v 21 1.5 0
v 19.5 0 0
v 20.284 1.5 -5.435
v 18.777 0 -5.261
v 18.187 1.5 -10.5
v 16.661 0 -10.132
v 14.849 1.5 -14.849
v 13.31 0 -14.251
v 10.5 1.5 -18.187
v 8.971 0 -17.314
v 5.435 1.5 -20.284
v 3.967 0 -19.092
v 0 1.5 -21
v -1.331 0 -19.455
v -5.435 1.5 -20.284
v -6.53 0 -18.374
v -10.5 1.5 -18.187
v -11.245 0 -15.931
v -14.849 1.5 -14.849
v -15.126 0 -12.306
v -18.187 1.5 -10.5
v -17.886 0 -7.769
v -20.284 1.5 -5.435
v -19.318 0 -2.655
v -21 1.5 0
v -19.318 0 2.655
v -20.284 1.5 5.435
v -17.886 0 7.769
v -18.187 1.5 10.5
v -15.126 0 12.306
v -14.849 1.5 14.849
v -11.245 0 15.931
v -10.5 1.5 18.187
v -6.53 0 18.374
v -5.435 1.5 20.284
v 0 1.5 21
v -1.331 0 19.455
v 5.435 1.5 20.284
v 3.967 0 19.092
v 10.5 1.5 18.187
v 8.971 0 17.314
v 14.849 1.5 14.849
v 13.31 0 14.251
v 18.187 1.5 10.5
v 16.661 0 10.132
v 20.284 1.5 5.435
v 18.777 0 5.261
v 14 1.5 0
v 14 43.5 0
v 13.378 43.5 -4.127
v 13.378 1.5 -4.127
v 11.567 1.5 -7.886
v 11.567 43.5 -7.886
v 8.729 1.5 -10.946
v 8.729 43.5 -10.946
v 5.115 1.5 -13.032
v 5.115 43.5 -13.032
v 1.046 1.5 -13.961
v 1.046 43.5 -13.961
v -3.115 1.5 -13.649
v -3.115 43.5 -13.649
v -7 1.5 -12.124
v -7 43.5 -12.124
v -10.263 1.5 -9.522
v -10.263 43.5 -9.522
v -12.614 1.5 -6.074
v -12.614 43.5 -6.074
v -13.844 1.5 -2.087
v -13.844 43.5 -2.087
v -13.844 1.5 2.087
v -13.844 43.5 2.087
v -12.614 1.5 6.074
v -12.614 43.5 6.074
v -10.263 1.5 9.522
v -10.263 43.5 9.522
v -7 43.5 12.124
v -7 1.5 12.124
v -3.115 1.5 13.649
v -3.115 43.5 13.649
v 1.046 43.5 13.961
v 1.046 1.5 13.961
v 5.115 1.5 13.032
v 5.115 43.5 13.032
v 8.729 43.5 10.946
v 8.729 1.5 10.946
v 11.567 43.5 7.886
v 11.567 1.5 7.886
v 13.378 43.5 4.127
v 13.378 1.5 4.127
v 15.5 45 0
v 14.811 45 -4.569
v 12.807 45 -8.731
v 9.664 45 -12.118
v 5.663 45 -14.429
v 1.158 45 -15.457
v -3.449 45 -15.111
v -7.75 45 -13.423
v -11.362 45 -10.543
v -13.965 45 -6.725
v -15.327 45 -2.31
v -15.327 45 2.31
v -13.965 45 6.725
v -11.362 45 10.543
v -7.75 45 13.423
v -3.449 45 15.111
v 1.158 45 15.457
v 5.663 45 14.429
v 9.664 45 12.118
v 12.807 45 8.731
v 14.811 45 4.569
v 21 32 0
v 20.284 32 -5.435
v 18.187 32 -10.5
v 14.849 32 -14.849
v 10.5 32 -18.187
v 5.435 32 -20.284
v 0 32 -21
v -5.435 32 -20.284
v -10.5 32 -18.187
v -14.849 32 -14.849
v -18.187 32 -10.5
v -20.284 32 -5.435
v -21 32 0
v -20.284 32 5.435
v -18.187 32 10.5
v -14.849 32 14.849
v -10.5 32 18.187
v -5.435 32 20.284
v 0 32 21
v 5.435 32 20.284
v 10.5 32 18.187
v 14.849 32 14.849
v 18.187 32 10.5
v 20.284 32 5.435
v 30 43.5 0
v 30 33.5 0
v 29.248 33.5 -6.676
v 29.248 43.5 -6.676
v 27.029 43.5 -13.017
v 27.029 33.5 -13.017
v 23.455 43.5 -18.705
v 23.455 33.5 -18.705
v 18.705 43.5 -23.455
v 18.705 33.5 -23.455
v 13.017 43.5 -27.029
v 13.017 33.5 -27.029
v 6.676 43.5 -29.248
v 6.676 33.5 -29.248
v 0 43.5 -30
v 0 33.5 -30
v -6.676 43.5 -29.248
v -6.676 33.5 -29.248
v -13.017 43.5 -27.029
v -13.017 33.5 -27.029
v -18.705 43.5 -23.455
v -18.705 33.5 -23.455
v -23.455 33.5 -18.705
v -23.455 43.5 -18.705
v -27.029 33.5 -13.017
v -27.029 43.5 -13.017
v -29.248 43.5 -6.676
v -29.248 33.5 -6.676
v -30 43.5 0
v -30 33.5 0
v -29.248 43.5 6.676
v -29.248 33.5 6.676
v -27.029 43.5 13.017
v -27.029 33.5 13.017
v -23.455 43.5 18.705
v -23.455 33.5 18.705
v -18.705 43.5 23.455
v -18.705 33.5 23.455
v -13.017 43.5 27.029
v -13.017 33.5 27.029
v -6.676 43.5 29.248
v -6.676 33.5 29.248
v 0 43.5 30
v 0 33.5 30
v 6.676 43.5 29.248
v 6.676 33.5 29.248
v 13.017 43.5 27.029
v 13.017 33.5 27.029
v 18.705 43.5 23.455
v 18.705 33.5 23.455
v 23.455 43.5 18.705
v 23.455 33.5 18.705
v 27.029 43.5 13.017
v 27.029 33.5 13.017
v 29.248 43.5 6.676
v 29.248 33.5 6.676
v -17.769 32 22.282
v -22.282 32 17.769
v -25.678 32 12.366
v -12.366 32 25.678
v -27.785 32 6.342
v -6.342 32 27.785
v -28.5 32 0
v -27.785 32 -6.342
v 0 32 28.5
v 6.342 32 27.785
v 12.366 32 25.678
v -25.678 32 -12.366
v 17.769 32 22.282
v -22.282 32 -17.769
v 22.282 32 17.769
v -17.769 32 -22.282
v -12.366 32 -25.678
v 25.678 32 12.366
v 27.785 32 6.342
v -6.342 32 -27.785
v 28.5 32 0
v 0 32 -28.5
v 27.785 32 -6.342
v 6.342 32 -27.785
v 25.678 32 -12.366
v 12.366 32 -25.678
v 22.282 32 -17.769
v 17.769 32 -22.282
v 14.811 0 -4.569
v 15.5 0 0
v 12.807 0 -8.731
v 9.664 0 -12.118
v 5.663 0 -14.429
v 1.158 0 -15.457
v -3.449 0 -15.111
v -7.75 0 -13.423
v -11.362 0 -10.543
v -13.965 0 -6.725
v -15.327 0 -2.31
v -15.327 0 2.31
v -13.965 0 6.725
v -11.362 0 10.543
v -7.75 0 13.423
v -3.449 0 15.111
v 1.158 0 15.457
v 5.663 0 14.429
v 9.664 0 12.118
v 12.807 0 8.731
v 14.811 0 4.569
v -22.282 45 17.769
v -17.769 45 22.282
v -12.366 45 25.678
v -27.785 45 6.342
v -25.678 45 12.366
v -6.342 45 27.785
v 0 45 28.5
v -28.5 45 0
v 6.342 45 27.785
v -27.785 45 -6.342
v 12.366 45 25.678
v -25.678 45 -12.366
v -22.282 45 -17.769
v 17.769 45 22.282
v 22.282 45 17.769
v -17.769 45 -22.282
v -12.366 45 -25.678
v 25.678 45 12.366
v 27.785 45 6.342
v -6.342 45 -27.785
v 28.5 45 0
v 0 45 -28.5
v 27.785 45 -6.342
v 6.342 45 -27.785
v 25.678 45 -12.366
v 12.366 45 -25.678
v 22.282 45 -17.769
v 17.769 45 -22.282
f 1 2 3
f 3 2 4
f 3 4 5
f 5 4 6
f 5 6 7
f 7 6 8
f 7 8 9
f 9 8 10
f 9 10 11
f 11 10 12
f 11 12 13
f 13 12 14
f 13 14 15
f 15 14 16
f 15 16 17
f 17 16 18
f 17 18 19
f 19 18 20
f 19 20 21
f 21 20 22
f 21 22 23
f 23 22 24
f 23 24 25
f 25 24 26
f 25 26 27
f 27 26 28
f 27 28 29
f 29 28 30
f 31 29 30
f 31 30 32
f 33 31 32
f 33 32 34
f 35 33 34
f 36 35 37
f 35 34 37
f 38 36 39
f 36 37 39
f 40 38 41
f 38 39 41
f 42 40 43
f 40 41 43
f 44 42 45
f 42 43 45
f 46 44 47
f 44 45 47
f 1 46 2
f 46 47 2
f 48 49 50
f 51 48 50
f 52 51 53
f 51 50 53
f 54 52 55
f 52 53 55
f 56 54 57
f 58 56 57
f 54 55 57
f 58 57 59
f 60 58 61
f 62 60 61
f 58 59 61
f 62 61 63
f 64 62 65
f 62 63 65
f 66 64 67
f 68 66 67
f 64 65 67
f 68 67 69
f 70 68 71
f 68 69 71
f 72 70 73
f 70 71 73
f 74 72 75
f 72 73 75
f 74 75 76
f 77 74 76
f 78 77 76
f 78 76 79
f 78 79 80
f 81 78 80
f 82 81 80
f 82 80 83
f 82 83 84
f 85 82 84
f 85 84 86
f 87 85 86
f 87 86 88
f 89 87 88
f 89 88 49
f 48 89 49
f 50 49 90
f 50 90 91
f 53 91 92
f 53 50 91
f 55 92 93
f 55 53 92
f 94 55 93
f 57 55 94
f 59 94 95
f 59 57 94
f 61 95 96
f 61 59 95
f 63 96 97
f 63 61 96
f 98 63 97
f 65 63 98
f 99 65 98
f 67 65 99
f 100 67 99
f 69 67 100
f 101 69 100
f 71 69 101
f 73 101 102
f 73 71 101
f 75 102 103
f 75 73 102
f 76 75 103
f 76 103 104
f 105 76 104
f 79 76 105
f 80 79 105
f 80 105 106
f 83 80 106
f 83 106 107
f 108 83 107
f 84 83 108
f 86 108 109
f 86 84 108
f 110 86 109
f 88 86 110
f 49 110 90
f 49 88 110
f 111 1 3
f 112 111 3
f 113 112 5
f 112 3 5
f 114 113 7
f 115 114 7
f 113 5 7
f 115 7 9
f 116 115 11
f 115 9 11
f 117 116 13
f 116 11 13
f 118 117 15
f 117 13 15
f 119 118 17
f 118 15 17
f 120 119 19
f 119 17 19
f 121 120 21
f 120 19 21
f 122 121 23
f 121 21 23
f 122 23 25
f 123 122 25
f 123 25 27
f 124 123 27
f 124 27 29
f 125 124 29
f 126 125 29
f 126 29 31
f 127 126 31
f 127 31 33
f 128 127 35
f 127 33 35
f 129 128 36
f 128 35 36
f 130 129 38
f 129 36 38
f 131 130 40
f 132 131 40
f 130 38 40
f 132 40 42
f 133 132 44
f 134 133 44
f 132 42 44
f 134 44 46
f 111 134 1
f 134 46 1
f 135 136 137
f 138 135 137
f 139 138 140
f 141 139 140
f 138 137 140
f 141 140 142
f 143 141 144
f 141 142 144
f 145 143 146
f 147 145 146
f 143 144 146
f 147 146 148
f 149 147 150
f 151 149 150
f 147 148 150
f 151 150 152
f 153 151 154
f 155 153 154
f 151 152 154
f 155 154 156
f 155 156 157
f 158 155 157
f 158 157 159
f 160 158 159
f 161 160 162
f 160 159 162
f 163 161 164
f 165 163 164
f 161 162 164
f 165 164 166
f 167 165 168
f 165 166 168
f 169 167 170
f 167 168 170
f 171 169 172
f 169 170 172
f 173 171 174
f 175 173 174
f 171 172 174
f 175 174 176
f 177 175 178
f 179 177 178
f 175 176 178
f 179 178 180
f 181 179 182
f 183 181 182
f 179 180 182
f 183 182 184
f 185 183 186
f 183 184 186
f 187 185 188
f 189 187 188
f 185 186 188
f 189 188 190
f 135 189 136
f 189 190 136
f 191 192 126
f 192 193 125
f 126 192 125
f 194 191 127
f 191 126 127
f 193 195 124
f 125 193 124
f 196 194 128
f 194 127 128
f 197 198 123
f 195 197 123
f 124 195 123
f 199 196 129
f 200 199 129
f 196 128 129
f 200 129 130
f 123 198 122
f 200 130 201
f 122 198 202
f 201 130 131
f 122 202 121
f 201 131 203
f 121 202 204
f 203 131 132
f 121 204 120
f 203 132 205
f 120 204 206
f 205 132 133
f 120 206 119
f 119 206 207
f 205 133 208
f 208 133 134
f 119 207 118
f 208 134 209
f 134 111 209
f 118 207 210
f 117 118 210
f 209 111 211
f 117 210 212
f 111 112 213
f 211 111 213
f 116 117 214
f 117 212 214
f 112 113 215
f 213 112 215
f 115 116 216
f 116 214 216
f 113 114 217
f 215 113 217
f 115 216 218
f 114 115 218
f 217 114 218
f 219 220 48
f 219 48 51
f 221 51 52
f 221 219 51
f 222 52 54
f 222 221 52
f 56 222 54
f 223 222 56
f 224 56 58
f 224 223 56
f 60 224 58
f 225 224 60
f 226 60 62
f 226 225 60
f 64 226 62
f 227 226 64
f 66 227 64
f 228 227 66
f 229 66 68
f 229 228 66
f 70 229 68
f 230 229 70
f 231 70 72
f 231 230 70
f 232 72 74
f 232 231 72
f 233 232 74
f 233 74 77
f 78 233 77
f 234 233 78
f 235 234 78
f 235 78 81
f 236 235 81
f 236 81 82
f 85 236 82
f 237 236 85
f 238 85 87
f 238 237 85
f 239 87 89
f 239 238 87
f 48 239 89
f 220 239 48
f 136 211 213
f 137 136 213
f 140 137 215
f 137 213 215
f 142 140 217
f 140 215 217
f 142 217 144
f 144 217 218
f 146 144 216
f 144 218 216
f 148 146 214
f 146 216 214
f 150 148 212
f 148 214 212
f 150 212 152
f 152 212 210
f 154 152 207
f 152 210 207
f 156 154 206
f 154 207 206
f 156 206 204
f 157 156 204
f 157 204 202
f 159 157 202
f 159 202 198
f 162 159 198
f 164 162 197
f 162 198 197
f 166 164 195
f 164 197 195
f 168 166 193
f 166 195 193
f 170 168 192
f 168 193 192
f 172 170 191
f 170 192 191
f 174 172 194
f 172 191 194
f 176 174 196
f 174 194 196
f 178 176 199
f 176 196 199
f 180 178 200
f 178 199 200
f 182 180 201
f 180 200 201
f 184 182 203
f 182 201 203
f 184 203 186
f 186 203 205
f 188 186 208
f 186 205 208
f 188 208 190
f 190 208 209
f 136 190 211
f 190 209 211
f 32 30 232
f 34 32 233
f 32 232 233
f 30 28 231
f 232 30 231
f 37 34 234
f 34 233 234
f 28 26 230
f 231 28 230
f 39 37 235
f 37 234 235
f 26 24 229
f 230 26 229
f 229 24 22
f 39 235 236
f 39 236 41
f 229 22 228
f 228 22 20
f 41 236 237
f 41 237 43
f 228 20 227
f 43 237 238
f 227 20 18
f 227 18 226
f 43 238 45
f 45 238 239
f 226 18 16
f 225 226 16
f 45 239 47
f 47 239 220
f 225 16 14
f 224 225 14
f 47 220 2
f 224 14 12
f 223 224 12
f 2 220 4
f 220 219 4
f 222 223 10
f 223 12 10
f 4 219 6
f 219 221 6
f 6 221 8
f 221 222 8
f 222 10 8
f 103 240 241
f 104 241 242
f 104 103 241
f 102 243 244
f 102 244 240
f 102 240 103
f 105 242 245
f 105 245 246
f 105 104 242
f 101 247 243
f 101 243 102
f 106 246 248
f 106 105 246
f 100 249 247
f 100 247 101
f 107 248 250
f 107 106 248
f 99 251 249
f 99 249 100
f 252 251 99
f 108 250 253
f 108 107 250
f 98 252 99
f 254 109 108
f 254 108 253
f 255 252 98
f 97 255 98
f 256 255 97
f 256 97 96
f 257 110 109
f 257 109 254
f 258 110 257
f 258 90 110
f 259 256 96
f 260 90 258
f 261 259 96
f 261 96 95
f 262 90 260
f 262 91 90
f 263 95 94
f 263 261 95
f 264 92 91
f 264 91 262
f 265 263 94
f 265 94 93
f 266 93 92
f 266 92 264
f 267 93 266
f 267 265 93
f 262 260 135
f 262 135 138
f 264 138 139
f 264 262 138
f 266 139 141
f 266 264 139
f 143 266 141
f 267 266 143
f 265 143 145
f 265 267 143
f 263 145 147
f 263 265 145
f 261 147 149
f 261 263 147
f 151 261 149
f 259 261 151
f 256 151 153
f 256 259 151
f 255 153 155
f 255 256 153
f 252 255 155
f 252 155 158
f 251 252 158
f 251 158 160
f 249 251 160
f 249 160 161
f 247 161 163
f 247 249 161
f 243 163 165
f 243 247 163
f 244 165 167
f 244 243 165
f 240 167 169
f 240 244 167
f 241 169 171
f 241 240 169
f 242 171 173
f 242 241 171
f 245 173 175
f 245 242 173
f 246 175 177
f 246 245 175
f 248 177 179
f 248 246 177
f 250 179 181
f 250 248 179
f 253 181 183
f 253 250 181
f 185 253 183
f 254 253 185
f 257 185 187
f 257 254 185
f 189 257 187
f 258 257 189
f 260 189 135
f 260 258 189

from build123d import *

# Parameters (mm, degrees)
SKETCH_1_R          = 21
EXTRUDE_1_DEPTH     = 32
SKETCH_2_R          = 30
EXTRUDE_2_DEPTH     = 13
SKETCH_3_R          = 14
CUT_EXTRUDE_1_DEPTH = 46
CHAMFER_1_SIZE      = 1.5


with BuildPart() as part:
    # 草图1 → 凸台-拉伸1 (new body)
    with BuildSketch(Plane(origin=(0, 0, 0), x_dir=(1, 0, 0), z_dir=(0, 1, 0))):
        Circle(SKETCH_1_R)
    extrude(amount=EXTRUDE_1_DEPTH)

    # 草图2 → 凸台-拉伸2 (add)
    with BuildSketch(Plane(origin=(0, 32, 0), x_dir=(1, 0, 0), z_dir=(0, 1, 0))):
        Circle(SKETCH_2_R)
    extrude(amount=EXTRUDE_2_DEPTH)

    # 草图3 → 切除-拉伸1 (cut, through all)
    with BuildSketch(Plane(origin=(0, 45, 0), x_dir=(1, 0, 0), z_dir=(0, 1, 0))):
        Circle(SKETCH_3_R)
    extrude(amount=-CUT_EXTRUDE_1_DEPTH, mode=Mode.SUBTRACT)

    # 倒角1
    chamfer_1_edges = [part.edges().sort_by_distance(p)[0] for p in [
        (-14, 0, 0),
        (-14, 45, 0),
        (-21, 0, 0),
        (-30, 32, 0),
        (-30, 45, 0),
    ]]
    chamfer(chamfer_1_edges, length=CHAMFER_1_SIZE)


solid = part.part
